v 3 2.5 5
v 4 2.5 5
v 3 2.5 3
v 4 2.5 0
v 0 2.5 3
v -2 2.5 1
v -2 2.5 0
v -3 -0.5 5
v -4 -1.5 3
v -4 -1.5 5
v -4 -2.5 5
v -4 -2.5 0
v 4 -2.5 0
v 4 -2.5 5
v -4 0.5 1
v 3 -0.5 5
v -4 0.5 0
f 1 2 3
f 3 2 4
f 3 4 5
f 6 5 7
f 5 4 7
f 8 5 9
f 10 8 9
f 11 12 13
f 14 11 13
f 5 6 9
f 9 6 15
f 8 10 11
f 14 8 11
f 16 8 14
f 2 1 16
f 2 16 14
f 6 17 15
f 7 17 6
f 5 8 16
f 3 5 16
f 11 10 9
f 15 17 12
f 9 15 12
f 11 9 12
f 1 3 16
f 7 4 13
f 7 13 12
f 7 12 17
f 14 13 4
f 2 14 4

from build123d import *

# Parameters (mm, degrees)
BOSS_EXTRUDE1_DEPTH = 3
CUT_EXTRUDE2_DEPTH  = 1
BOSS_EXTRUDE2_DEPTH = 2
BOSS_EXTRUDE3_DEPTH = 2
CUT_EXTRUDE3_DEPTH  = 3


with BuildPart() as part:
    # Sketch1 → Boss-Extrude1 (new body)
    with BuildSketch(Plane.XY):
        Polygon((-4, 0.5), (-2, 2.5), (4, 2.5), (4, -2.5), (-4, -2.5), align=None)
    extrude(amount=BOSS_EXTRUDE1_DEPTH)

    # 3DSketch1 → Cut-Extrude2 (cut, along a direction that is not the sketch's normal)
    with BuildSketch(Plane(origin=(-4, -1.5, 3), x_dir=(0.7071067811865476, 0.7071067811865476, 0), z_dir=(-0.5773502691896258, 0.5773502691896258, 0.5773502691896258))):
        Polygon((0, 0), (1.414213562, 2.449489743), (4.242640687, 2.449489743), (5.656854249, 0), align=None)
    extrude(amount=CUT_EXTRUDE2_DEPTH, dir=(-0.7071067811865476, 0.7071067811865476, 0), mode=Mode.SUBTRACT)


with BuildPart() as cut_extrude2_kept_piece:
    # of the separate pieces the step leaves, the one the design keeps (cut_extrude2_pieces_kept)
    add(part.part.solids().sort_by_distance((-4, 0.5, 0))[0])

    # Sketch2 → Boss-Extrude2 (add)
    with BuildSketch(Plane.XY.offset(3)):
        Polygon((4, 2.5), (3, 2.5), (3, -0.5), (-3, -0.5), (-4, -1.5), (-4, -2.5), (4, -2.5), align=None)
    extrude(amount=BOSS_EXTRUDE2_DEPTH)

    # Sketch3 → Boss-Extrude3 (add)
    with BuildSketch(Plane.XY.offset(3)):
        Polygon((-3, -0.5), (3, -0.5), (3, 2.5), (0, 2.5), align=None)
    extrude(amount=BOSS_EXTRUDE3_DEPTH)

    # 3DSketch3 → Cut-Extrude3 (cut, along a direction that is not the sketch's normal)
    with BuildSketch(Plane(origin=(-4, -0.5, 5), x_dir=(0.8890008890013336, 0.38100038100057165, -0.25400025400038106), z_dir=(0, -0.5547001962252291, -0.8320502943378437))):
        Polygon((0, 0), (5.207005207, -1.37371641), (7.874007874, 0), (6.223006223, 3.205338289), align=None)
    extrude(amount=-CUT_EXTRUDE3_DEPTH, dir=(0, -1, 0), mode=Mode.SUBTRACT)


solid = cut_extrude2_kept_piece.part
